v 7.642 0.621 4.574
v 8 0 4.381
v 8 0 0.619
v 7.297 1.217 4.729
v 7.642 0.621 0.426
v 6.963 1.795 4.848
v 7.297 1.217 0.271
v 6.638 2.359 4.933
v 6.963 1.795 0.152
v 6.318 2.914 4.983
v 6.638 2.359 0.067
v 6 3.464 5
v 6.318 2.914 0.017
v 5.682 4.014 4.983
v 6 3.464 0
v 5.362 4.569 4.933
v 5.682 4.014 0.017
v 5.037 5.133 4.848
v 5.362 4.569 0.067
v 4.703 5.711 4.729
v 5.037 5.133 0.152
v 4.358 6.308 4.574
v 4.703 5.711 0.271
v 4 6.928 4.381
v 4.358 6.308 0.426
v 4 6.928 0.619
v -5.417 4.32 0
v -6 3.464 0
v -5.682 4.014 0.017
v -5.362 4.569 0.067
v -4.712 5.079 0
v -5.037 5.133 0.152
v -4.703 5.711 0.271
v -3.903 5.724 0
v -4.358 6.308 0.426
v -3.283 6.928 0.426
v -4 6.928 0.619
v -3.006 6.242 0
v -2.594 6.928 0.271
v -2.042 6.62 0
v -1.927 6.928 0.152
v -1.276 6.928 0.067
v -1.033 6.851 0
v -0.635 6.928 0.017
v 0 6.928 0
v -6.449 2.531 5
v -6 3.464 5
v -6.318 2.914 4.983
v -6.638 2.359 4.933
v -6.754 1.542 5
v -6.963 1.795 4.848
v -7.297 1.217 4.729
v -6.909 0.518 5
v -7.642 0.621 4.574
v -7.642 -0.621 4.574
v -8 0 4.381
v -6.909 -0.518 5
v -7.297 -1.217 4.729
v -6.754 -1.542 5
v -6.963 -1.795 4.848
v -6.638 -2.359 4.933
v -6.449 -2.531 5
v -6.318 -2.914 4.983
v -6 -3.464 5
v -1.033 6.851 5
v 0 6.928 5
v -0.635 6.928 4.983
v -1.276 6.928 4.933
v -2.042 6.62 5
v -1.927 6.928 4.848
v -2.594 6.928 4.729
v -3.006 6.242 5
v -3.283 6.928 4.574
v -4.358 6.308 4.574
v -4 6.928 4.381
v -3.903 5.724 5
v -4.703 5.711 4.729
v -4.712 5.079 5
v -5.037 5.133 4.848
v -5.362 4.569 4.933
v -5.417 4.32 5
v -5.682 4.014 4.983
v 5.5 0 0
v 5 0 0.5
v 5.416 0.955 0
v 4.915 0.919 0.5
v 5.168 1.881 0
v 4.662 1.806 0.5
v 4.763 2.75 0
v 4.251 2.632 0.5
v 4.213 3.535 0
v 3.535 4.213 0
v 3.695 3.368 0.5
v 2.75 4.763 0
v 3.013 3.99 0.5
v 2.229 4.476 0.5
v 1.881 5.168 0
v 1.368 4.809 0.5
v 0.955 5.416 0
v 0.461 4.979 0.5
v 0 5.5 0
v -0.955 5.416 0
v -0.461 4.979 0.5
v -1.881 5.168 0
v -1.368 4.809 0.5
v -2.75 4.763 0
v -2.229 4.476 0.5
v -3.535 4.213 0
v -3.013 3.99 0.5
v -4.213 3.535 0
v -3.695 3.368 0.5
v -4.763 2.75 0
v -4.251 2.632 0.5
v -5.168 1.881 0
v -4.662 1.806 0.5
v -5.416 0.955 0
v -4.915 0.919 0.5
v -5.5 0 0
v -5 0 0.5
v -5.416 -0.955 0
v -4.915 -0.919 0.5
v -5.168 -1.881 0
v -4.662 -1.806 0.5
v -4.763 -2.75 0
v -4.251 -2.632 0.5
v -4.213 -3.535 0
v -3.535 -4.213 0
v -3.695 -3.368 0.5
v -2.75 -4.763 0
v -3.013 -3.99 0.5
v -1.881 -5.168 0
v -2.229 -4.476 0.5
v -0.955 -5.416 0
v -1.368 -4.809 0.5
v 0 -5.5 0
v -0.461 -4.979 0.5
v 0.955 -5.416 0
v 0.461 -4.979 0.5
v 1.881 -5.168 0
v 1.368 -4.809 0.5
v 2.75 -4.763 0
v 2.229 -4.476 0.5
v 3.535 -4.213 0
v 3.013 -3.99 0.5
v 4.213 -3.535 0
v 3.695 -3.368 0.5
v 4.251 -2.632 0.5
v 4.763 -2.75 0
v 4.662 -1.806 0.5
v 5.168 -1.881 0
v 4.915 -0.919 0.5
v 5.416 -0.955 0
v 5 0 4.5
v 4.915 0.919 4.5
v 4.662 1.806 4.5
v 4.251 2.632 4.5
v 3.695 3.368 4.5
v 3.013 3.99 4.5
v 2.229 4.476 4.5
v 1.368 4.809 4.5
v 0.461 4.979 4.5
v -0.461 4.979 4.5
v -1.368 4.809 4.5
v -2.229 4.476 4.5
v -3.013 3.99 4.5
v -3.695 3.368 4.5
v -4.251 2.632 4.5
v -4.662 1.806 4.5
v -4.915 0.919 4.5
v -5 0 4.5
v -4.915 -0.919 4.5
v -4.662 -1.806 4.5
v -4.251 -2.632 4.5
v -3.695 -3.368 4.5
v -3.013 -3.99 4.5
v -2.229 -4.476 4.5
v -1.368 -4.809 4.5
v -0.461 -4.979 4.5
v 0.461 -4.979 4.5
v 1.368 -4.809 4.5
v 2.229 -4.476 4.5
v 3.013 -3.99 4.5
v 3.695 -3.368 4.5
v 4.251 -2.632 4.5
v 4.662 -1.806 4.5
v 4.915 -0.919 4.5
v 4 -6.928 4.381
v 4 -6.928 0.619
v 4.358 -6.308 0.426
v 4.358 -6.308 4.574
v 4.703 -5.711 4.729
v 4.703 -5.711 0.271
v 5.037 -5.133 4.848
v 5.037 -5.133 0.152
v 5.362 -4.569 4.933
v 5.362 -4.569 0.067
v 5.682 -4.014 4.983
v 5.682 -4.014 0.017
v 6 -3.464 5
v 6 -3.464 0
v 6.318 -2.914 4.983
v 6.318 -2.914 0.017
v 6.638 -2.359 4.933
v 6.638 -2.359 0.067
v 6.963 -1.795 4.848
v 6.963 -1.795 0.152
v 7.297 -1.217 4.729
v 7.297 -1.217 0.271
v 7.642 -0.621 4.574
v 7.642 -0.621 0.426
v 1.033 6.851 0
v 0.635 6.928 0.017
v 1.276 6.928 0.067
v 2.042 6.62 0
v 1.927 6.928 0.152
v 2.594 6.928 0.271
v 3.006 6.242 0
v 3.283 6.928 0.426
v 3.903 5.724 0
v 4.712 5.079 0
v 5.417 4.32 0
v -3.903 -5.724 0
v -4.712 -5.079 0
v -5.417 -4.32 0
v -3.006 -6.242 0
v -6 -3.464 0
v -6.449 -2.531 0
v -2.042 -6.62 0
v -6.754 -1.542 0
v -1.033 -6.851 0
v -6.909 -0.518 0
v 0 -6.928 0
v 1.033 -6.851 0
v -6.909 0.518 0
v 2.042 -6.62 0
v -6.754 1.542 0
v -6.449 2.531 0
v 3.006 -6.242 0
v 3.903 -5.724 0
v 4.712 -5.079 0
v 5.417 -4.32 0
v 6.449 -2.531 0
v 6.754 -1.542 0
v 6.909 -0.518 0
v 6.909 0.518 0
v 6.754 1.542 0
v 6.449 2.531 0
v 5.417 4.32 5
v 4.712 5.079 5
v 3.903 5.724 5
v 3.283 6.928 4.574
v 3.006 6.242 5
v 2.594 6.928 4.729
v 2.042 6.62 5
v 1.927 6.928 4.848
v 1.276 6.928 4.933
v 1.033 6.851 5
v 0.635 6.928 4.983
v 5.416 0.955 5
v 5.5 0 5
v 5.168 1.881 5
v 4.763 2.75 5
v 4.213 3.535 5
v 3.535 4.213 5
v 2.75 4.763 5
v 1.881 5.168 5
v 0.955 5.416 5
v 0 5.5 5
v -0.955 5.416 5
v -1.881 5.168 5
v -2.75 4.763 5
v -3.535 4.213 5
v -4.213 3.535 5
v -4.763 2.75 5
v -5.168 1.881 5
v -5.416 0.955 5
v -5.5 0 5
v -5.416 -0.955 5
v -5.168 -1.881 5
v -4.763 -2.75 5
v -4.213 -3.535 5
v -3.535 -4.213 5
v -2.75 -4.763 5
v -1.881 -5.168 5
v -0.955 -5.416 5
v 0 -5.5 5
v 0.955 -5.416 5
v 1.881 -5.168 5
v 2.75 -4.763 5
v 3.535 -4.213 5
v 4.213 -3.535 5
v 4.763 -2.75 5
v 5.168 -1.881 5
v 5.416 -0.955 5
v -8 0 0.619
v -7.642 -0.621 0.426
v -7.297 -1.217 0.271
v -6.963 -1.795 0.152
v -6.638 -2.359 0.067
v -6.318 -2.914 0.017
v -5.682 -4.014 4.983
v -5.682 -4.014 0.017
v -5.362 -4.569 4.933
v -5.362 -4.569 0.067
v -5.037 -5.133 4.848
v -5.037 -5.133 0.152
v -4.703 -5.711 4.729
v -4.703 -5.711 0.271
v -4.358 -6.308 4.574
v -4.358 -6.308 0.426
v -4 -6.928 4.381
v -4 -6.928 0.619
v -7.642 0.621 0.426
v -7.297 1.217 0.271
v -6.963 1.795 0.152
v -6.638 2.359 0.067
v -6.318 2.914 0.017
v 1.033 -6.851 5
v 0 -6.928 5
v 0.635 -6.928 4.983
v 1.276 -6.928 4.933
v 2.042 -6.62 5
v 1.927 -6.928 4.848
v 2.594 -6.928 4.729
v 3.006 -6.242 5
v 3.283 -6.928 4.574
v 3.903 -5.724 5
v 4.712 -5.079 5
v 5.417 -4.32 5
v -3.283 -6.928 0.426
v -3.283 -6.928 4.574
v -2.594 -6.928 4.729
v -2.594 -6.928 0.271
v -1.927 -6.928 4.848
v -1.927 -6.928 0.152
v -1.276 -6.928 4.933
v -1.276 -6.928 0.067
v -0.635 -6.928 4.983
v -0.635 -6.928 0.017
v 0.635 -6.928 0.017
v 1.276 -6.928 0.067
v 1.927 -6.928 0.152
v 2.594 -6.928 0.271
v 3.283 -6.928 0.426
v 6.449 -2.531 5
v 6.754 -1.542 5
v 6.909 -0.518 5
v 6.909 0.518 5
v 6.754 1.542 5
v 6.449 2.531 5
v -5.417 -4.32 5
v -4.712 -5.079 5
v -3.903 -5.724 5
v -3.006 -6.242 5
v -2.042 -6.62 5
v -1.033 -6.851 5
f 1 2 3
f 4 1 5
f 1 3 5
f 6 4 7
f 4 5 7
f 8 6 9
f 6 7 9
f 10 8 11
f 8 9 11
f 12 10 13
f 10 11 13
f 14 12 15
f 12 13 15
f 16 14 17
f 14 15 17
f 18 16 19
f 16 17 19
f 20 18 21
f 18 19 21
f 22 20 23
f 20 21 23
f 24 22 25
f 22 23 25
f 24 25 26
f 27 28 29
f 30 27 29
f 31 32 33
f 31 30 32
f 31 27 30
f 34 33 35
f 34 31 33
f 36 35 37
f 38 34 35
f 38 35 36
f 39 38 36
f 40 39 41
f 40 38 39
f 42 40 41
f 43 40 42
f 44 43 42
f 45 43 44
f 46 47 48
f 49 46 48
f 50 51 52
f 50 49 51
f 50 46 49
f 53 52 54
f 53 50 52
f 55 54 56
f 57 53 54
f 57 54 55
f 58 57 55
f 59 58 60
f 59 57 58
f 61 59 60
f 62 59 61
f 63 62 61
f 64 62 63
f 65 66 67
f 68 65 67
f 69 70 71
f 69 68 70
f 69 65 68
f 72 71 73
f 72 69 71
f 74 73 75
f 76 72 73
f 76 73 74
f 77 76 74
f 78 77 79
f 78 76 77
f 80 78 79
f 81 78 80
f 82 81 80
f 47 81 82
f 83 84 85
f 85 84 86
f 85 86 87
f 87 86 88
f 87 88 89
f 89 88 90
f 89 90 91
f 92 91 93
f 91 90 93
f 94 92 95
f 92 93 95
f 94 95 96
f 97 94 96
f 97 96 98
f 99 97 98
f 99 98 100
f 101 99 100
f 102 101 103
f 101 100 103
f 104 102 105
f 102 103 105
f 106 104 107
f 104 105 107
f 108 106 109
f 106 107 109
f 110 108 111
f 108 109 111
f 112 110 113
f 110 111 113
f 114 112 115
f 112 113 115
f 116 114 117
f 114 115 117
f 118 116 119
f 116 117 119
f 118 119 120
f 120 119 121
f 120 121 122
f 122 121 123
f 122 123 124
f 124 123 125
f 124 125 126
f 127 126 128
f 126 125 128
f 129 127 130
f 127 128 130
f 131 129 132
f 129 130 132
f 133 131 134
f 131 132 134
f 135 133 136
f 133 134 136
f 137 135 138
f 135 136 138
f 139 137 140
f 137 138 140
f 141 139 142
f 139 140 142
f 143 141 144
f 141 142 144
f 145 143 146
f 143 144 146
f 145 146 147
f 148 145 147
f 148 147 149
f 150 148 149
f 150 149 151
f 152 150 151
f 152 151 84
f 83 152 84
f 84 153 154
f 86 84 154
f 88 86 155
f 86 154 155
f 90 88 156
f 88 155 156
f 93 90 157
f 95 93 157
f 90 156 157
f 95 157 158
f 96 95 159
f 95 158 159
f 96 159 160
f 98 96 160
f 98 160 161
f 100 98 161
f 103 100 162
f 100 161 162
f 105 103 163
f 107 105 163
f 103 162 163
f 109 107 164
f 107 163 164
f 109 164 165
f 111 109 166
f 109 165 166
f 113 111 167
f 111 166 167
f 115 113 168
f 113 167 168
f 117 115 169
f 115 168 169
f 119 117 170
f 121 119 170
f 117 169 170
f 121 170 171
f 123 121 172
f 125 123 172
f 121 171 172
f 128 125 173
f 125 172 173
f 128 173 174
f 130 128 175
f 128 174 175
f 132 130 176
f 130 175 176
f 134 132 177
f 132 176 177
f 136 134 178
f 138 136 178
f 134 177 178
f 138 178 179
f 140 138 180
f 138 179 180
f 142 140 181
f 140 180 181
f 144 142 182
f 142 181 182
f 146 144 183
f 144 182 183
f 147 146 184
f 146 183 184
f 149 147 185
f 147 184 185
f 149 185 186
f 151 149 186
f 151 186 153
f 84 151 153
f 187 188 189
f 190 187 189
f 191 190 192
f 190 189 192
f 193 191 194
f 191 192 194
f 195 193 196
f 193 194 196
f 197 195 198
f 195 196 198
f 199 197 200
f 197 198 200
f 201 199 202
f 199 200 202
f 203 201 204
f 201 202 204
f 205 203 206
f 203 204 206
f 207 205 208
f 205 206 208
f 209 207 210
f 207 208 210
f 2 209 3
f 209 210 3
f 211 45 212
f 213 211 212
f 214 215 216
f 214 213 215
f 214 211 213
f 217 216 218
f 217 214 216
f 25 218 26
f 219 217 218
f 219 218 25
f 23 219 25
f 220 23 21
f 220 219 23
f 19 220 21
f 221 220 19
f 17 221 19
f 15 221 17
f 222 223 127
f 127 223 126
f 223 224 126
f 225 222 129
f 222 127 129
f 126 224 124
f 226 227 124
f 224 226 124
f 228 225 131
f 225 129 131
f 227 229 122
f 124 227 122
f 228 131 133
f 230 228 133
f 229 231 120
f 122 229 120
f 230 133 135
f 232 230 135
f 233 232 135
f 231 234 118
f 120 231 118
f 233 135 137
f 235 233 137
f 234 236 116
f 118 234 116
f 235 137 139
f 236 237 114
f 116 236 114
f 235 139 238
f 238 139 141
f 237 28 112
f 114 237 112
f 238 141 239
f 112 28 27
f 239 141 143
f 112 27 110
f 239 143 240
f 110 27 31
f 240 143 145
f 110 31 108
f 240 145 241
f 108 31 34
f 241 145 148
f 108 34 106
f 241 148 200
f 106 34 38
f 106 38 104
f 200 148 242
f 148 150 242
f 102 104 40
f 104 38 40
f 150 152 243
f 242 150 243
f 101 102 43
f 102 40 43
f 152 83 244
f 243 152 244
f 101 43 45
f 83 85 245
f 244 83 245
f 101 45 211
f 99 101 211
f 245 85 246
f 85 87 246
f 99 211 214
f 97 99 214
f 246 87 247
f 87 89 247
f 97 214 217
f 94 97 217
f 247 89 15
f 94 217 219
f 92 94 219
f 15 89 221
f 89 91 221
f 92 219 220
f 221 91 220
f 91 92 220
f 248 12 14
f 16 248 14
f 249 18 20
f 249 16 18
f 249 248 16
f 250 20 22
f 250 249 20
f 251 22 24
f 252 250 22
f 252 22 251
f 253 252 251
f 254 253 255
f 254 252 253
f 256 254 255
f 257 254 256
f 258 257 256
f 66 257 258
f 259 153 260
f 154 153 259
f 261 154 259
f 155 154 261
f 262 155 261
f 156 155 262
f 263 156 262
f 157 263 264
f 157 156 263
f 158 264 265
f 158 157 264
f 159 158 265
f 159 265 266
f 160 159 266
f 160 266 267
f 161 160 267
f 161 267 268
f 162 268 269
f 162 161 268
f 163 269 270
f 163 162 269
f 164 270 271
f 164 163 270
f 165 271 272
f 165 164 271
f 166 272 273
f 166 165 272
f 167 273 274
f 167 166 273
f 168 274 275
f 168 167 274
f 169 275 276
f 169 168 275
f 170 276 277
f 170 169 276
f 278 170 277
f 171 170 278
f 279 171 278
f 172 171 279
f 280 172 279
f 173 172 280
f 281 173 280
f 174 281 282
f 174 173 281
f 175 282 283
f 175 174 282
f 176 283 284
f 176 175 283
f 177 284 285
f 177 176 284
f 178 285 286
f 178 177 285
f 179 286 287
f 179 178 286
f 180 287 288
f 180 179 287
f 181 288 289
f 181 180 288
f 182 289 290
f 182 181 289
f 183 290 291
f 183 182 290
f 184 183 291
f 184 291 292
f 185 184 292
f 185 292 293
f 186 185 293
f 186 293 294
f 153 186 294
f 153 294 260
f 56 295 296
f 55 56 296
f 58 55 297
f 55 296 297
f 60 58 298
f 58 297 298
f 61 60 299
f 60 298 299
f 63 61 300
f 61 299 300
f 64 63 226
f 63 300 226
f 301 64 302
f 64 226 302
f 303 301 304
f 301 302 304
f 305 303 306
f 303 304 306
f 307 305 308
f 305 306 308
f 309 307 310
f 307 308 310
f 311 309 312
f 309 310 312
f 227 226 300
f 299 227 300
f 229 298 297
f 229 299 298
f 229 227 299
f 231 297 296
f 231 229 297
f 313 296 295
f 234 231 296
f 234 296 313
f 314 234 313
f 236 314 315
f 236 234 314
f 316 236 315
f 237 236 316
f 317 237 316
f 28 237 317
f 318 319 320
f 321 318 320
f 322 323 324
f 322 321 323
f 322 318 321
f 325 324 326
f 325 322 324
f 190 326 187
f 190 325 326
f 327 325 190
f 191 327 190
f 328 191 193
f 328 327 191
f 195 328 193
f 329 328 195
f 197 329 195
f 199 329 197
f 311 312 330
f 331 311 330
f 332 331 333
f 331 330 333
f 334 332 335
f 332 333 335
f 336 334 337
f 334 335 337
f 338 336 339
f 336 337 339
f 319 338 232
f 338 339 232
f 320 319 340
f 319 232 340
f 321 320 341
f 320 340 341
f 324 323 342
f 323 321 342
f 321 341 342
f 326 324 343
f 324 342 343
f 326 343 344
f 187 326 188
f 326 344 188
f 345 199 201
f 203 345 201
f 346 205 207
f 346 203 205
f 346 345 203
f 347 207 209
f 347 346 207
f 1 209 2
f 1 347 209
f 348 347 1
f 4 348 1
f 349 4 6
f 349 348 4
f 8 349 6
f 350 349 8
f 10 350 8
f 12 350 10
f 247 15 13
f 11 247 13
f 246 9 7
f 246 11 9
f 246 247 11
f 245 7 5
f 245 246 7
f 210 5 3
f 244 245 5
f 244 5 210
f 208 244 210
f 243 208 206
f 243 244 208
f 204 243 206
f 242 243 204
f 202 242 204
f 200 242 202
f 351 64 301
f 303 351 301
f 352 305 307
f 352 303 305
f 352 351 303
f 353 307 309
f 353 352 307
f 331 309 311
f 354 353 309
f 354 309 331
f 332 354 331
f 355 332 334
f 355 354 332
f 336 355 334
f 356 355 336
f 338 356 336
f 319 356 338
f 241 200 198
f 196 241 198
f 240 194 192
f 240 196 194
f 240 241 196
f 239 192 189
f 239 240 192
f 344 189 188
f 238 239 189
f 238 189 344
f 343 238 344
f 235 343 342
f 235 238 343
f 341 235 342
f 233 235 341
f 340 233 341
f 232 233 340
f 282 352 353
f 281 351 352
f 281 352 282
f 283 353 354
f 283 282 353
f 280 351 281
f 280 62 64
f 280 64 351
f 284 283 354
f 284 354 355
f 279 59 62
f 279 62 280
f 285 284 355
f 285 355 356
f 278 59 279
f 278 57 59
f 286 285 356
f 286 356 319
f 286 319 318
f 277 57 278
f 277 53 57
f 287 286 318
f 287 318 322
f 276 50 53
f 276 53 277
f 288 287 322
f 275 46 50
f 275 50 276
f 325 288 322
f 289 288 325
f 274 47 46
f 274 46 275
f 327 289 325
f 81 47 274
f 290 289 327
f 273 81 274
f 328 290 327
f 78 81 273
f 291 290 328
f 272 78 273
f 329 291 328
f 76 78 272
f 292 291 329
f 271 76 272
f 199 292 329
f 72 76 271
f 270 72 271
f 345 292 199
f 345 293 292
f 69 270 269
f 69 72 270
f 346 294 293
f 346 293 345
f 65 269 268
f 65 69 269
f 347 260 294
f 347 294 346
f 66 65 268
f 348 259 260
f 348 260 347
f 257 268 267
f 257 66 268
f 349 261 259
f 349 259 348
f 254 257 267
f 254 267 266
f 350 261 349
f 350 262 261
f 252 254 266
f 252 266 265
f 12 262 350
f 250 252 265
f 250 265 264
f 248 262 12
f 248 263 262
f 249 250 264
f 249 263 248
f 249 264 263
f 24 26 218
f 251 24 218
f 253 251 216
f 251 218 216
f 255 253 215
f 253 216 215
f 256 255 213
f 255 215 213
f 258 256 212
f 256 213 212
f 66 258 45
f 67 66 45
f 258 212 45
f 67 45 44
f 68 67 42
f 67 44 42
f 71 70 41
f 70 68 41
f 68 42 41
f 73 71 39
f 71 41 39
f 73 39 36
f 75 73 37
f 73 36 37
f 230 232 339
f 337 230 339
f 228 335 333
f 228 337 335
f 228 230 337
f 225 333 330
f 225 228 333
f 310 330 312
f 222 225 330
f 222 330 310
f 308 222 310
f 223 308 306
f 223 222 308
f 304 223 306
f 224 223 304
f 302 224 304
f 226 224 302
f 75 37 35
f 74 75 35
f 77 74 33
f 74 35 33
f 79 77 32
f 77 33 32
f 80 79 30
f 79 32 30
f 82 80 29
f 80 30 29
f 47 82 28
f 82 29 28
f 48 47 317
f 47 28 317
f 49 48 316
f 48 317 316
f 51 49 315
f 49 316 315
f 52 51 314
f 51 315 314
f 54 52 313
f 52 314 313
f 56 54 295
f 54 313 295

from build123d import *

# Parameters (mm, degrees)
DODANIE_WYCI_GNI_CIE1_DEPTH = 5
SZKIC2_R                    = 5
WYTNIJ_WYCI_GNI_CIE1_DEPTH  = 5
SFAZOWANIE1_SIZE            = 0.5
SZKIC6_OUTSIDE_W            = 56.99
SZKIC6_OUTSIDE_H            = 54.846
SZKIC6_OUTSIDE_R            = 6.92820323
WYTNIJ_WYCI_GNI_CIE2_DEPTH  = 10
WYTNIJ_WYCI_GNI_CIE2_DRAFT  = -60
SZKIC7_OUTSIDE_W            = 56.99
SZKIC7_OUTSIDE_H            = 54.846
SZKIC7_OUTSIDE_R            = 6.92820323
WYTNIJ_WYCI_GNI_CIE3_DEPTH  = 10
WYTNIJ_WYCI_GNI_CIE3_DRAFT  = -60


with BuildPart() as part:
    # Szkic1 → Dodanie-wyciągnięcie1 (new body)
    with BuildSketch(Plane.XY):
        Polygon((-4, 6.92820323), (-8, 0), (-4, -6.92820323), (4, -6.92820323), (8, 0), (4, 6.92820323), align=None)
    extrude(amount=DODANIE_WYCI_GNI_CIE1_DEPTH)

    # Szkic2 → Wytnij-wyciągnięcie1 (cut)
    with BuildSketch(Plane.XY.offset(5)):
        Circle(SZKIC2_R)
    extrude(amount=-WYTNIJ_WYCI_GNI_CIE1_DEPTH, mode=Mode.SUBTRACT)

    # Sfazowanie1
    sfazowanie1_edges = [part.edges().sort_by_distance(p)[0] for p in [
        (-5, 0, 0),
        (-5, 0, 5),
    ]]
    chamfer(sfazowanie1_edges, length=SFAZOWANIE1_SIZE)


with BuildPart() as wytnij_wyci_gni_cie2_tool:
    # Szkic6 outside → Wytnij-wyciągnięcie2 (with draft: the straight prism first)
    with BuildSketch(Plane(origin=(0, 0, 0), x_dir=(-1, 0, 0), z_dir=(0, 0, -1))):
        Rectangle(SZKIC6_OUTSIDE_W, SZKIC6_OUTSIDE_H)
        Circle(SZKIC6_OUTSIDE_R, mode=Mode.SUBTRACT)
    extrude(amount=-WYTNIJ_WYCI_GNI_CIE2_DEPTH)
    # Wytnij-wyciągnięcie2: the draft: its side faces are tilted about the plane it starts from
    wytnij_wyci_gni_cie2_sides = [wytnij_wyci_gni_cie2_tool.faces().sort_by_distance(p)[0] for p in [
        (0, -27.423, 5),
        (-28.495, 0, 5),
        (0, 27.423, 5),
        (28.495, 0, 5),
        (6.92820323, 0, 5),
    ]]
    draft(wytnij_wyci_gni_cie2_sides, Plane(origin=(0, 0, 0), x_dir=(-1, 0, 0), z_dir=(0, 0, -1)), WYTNIJ_WYCI_GNI_CIE2_DRAFT)


with BuildPart() as part_1:
    add(part.part)

    # Wytnij-wyciągnięcie2: cut by wytnij_wyci_gni_cie2_tool
    add(wytnij_wyci_gni_cie2_tool.part, mode=Mode.SUBTRACT)


with BuildPart() as wytnij_wyci_gni_cie3_tool:
    # Szkic7 outside → Wytnij-wyciągnięcie3 (with draft: the straight prism first)
    with BuildSketch(Plane.XY.offset(5)):
        Rectangle(SZKIC7_OUTSIDE_W, SZKIC7_OUTSIDE_H)
        Circle(SZKIC7_OUTSIDE_R, mode=Mode.SUBTRACT)
    extrude(amount=-WYTNIJ_WYCI_GNI_CIE3_DEPTH)
    # Wytnij-wyciągnięcie3: the draft: its side faces are tilted about the plane it starts from
    wytnij_wyci_gni_cie3_sides = [wytnij_wyci_gni_cie3_tool.faces().sort_by_distance(p)[0] for p in [
        (0, -27.423, 0),
        (28.495, 0, 0),
        (0, 27.423, 0),
        (-28.495, 0, 0),
        (-6.92820323, 0, 0),
    ]]
    draft(wytnij_wyci_gni_cie3_sides, Plane.XY.offset(5), WYTNIJ_WYCI_GNI_CIE3_DRAFT)


with BuildPart() as part_2:
    add(part_1.part)

    # Wytnij-wyciągnięcie3: cut by wytnij_wyci_gni_cie3_tool
    add(wytnij_wyci_gni_cie3_tool.part, mode=Mode.SUBTRACT)


solid = part_2.part
